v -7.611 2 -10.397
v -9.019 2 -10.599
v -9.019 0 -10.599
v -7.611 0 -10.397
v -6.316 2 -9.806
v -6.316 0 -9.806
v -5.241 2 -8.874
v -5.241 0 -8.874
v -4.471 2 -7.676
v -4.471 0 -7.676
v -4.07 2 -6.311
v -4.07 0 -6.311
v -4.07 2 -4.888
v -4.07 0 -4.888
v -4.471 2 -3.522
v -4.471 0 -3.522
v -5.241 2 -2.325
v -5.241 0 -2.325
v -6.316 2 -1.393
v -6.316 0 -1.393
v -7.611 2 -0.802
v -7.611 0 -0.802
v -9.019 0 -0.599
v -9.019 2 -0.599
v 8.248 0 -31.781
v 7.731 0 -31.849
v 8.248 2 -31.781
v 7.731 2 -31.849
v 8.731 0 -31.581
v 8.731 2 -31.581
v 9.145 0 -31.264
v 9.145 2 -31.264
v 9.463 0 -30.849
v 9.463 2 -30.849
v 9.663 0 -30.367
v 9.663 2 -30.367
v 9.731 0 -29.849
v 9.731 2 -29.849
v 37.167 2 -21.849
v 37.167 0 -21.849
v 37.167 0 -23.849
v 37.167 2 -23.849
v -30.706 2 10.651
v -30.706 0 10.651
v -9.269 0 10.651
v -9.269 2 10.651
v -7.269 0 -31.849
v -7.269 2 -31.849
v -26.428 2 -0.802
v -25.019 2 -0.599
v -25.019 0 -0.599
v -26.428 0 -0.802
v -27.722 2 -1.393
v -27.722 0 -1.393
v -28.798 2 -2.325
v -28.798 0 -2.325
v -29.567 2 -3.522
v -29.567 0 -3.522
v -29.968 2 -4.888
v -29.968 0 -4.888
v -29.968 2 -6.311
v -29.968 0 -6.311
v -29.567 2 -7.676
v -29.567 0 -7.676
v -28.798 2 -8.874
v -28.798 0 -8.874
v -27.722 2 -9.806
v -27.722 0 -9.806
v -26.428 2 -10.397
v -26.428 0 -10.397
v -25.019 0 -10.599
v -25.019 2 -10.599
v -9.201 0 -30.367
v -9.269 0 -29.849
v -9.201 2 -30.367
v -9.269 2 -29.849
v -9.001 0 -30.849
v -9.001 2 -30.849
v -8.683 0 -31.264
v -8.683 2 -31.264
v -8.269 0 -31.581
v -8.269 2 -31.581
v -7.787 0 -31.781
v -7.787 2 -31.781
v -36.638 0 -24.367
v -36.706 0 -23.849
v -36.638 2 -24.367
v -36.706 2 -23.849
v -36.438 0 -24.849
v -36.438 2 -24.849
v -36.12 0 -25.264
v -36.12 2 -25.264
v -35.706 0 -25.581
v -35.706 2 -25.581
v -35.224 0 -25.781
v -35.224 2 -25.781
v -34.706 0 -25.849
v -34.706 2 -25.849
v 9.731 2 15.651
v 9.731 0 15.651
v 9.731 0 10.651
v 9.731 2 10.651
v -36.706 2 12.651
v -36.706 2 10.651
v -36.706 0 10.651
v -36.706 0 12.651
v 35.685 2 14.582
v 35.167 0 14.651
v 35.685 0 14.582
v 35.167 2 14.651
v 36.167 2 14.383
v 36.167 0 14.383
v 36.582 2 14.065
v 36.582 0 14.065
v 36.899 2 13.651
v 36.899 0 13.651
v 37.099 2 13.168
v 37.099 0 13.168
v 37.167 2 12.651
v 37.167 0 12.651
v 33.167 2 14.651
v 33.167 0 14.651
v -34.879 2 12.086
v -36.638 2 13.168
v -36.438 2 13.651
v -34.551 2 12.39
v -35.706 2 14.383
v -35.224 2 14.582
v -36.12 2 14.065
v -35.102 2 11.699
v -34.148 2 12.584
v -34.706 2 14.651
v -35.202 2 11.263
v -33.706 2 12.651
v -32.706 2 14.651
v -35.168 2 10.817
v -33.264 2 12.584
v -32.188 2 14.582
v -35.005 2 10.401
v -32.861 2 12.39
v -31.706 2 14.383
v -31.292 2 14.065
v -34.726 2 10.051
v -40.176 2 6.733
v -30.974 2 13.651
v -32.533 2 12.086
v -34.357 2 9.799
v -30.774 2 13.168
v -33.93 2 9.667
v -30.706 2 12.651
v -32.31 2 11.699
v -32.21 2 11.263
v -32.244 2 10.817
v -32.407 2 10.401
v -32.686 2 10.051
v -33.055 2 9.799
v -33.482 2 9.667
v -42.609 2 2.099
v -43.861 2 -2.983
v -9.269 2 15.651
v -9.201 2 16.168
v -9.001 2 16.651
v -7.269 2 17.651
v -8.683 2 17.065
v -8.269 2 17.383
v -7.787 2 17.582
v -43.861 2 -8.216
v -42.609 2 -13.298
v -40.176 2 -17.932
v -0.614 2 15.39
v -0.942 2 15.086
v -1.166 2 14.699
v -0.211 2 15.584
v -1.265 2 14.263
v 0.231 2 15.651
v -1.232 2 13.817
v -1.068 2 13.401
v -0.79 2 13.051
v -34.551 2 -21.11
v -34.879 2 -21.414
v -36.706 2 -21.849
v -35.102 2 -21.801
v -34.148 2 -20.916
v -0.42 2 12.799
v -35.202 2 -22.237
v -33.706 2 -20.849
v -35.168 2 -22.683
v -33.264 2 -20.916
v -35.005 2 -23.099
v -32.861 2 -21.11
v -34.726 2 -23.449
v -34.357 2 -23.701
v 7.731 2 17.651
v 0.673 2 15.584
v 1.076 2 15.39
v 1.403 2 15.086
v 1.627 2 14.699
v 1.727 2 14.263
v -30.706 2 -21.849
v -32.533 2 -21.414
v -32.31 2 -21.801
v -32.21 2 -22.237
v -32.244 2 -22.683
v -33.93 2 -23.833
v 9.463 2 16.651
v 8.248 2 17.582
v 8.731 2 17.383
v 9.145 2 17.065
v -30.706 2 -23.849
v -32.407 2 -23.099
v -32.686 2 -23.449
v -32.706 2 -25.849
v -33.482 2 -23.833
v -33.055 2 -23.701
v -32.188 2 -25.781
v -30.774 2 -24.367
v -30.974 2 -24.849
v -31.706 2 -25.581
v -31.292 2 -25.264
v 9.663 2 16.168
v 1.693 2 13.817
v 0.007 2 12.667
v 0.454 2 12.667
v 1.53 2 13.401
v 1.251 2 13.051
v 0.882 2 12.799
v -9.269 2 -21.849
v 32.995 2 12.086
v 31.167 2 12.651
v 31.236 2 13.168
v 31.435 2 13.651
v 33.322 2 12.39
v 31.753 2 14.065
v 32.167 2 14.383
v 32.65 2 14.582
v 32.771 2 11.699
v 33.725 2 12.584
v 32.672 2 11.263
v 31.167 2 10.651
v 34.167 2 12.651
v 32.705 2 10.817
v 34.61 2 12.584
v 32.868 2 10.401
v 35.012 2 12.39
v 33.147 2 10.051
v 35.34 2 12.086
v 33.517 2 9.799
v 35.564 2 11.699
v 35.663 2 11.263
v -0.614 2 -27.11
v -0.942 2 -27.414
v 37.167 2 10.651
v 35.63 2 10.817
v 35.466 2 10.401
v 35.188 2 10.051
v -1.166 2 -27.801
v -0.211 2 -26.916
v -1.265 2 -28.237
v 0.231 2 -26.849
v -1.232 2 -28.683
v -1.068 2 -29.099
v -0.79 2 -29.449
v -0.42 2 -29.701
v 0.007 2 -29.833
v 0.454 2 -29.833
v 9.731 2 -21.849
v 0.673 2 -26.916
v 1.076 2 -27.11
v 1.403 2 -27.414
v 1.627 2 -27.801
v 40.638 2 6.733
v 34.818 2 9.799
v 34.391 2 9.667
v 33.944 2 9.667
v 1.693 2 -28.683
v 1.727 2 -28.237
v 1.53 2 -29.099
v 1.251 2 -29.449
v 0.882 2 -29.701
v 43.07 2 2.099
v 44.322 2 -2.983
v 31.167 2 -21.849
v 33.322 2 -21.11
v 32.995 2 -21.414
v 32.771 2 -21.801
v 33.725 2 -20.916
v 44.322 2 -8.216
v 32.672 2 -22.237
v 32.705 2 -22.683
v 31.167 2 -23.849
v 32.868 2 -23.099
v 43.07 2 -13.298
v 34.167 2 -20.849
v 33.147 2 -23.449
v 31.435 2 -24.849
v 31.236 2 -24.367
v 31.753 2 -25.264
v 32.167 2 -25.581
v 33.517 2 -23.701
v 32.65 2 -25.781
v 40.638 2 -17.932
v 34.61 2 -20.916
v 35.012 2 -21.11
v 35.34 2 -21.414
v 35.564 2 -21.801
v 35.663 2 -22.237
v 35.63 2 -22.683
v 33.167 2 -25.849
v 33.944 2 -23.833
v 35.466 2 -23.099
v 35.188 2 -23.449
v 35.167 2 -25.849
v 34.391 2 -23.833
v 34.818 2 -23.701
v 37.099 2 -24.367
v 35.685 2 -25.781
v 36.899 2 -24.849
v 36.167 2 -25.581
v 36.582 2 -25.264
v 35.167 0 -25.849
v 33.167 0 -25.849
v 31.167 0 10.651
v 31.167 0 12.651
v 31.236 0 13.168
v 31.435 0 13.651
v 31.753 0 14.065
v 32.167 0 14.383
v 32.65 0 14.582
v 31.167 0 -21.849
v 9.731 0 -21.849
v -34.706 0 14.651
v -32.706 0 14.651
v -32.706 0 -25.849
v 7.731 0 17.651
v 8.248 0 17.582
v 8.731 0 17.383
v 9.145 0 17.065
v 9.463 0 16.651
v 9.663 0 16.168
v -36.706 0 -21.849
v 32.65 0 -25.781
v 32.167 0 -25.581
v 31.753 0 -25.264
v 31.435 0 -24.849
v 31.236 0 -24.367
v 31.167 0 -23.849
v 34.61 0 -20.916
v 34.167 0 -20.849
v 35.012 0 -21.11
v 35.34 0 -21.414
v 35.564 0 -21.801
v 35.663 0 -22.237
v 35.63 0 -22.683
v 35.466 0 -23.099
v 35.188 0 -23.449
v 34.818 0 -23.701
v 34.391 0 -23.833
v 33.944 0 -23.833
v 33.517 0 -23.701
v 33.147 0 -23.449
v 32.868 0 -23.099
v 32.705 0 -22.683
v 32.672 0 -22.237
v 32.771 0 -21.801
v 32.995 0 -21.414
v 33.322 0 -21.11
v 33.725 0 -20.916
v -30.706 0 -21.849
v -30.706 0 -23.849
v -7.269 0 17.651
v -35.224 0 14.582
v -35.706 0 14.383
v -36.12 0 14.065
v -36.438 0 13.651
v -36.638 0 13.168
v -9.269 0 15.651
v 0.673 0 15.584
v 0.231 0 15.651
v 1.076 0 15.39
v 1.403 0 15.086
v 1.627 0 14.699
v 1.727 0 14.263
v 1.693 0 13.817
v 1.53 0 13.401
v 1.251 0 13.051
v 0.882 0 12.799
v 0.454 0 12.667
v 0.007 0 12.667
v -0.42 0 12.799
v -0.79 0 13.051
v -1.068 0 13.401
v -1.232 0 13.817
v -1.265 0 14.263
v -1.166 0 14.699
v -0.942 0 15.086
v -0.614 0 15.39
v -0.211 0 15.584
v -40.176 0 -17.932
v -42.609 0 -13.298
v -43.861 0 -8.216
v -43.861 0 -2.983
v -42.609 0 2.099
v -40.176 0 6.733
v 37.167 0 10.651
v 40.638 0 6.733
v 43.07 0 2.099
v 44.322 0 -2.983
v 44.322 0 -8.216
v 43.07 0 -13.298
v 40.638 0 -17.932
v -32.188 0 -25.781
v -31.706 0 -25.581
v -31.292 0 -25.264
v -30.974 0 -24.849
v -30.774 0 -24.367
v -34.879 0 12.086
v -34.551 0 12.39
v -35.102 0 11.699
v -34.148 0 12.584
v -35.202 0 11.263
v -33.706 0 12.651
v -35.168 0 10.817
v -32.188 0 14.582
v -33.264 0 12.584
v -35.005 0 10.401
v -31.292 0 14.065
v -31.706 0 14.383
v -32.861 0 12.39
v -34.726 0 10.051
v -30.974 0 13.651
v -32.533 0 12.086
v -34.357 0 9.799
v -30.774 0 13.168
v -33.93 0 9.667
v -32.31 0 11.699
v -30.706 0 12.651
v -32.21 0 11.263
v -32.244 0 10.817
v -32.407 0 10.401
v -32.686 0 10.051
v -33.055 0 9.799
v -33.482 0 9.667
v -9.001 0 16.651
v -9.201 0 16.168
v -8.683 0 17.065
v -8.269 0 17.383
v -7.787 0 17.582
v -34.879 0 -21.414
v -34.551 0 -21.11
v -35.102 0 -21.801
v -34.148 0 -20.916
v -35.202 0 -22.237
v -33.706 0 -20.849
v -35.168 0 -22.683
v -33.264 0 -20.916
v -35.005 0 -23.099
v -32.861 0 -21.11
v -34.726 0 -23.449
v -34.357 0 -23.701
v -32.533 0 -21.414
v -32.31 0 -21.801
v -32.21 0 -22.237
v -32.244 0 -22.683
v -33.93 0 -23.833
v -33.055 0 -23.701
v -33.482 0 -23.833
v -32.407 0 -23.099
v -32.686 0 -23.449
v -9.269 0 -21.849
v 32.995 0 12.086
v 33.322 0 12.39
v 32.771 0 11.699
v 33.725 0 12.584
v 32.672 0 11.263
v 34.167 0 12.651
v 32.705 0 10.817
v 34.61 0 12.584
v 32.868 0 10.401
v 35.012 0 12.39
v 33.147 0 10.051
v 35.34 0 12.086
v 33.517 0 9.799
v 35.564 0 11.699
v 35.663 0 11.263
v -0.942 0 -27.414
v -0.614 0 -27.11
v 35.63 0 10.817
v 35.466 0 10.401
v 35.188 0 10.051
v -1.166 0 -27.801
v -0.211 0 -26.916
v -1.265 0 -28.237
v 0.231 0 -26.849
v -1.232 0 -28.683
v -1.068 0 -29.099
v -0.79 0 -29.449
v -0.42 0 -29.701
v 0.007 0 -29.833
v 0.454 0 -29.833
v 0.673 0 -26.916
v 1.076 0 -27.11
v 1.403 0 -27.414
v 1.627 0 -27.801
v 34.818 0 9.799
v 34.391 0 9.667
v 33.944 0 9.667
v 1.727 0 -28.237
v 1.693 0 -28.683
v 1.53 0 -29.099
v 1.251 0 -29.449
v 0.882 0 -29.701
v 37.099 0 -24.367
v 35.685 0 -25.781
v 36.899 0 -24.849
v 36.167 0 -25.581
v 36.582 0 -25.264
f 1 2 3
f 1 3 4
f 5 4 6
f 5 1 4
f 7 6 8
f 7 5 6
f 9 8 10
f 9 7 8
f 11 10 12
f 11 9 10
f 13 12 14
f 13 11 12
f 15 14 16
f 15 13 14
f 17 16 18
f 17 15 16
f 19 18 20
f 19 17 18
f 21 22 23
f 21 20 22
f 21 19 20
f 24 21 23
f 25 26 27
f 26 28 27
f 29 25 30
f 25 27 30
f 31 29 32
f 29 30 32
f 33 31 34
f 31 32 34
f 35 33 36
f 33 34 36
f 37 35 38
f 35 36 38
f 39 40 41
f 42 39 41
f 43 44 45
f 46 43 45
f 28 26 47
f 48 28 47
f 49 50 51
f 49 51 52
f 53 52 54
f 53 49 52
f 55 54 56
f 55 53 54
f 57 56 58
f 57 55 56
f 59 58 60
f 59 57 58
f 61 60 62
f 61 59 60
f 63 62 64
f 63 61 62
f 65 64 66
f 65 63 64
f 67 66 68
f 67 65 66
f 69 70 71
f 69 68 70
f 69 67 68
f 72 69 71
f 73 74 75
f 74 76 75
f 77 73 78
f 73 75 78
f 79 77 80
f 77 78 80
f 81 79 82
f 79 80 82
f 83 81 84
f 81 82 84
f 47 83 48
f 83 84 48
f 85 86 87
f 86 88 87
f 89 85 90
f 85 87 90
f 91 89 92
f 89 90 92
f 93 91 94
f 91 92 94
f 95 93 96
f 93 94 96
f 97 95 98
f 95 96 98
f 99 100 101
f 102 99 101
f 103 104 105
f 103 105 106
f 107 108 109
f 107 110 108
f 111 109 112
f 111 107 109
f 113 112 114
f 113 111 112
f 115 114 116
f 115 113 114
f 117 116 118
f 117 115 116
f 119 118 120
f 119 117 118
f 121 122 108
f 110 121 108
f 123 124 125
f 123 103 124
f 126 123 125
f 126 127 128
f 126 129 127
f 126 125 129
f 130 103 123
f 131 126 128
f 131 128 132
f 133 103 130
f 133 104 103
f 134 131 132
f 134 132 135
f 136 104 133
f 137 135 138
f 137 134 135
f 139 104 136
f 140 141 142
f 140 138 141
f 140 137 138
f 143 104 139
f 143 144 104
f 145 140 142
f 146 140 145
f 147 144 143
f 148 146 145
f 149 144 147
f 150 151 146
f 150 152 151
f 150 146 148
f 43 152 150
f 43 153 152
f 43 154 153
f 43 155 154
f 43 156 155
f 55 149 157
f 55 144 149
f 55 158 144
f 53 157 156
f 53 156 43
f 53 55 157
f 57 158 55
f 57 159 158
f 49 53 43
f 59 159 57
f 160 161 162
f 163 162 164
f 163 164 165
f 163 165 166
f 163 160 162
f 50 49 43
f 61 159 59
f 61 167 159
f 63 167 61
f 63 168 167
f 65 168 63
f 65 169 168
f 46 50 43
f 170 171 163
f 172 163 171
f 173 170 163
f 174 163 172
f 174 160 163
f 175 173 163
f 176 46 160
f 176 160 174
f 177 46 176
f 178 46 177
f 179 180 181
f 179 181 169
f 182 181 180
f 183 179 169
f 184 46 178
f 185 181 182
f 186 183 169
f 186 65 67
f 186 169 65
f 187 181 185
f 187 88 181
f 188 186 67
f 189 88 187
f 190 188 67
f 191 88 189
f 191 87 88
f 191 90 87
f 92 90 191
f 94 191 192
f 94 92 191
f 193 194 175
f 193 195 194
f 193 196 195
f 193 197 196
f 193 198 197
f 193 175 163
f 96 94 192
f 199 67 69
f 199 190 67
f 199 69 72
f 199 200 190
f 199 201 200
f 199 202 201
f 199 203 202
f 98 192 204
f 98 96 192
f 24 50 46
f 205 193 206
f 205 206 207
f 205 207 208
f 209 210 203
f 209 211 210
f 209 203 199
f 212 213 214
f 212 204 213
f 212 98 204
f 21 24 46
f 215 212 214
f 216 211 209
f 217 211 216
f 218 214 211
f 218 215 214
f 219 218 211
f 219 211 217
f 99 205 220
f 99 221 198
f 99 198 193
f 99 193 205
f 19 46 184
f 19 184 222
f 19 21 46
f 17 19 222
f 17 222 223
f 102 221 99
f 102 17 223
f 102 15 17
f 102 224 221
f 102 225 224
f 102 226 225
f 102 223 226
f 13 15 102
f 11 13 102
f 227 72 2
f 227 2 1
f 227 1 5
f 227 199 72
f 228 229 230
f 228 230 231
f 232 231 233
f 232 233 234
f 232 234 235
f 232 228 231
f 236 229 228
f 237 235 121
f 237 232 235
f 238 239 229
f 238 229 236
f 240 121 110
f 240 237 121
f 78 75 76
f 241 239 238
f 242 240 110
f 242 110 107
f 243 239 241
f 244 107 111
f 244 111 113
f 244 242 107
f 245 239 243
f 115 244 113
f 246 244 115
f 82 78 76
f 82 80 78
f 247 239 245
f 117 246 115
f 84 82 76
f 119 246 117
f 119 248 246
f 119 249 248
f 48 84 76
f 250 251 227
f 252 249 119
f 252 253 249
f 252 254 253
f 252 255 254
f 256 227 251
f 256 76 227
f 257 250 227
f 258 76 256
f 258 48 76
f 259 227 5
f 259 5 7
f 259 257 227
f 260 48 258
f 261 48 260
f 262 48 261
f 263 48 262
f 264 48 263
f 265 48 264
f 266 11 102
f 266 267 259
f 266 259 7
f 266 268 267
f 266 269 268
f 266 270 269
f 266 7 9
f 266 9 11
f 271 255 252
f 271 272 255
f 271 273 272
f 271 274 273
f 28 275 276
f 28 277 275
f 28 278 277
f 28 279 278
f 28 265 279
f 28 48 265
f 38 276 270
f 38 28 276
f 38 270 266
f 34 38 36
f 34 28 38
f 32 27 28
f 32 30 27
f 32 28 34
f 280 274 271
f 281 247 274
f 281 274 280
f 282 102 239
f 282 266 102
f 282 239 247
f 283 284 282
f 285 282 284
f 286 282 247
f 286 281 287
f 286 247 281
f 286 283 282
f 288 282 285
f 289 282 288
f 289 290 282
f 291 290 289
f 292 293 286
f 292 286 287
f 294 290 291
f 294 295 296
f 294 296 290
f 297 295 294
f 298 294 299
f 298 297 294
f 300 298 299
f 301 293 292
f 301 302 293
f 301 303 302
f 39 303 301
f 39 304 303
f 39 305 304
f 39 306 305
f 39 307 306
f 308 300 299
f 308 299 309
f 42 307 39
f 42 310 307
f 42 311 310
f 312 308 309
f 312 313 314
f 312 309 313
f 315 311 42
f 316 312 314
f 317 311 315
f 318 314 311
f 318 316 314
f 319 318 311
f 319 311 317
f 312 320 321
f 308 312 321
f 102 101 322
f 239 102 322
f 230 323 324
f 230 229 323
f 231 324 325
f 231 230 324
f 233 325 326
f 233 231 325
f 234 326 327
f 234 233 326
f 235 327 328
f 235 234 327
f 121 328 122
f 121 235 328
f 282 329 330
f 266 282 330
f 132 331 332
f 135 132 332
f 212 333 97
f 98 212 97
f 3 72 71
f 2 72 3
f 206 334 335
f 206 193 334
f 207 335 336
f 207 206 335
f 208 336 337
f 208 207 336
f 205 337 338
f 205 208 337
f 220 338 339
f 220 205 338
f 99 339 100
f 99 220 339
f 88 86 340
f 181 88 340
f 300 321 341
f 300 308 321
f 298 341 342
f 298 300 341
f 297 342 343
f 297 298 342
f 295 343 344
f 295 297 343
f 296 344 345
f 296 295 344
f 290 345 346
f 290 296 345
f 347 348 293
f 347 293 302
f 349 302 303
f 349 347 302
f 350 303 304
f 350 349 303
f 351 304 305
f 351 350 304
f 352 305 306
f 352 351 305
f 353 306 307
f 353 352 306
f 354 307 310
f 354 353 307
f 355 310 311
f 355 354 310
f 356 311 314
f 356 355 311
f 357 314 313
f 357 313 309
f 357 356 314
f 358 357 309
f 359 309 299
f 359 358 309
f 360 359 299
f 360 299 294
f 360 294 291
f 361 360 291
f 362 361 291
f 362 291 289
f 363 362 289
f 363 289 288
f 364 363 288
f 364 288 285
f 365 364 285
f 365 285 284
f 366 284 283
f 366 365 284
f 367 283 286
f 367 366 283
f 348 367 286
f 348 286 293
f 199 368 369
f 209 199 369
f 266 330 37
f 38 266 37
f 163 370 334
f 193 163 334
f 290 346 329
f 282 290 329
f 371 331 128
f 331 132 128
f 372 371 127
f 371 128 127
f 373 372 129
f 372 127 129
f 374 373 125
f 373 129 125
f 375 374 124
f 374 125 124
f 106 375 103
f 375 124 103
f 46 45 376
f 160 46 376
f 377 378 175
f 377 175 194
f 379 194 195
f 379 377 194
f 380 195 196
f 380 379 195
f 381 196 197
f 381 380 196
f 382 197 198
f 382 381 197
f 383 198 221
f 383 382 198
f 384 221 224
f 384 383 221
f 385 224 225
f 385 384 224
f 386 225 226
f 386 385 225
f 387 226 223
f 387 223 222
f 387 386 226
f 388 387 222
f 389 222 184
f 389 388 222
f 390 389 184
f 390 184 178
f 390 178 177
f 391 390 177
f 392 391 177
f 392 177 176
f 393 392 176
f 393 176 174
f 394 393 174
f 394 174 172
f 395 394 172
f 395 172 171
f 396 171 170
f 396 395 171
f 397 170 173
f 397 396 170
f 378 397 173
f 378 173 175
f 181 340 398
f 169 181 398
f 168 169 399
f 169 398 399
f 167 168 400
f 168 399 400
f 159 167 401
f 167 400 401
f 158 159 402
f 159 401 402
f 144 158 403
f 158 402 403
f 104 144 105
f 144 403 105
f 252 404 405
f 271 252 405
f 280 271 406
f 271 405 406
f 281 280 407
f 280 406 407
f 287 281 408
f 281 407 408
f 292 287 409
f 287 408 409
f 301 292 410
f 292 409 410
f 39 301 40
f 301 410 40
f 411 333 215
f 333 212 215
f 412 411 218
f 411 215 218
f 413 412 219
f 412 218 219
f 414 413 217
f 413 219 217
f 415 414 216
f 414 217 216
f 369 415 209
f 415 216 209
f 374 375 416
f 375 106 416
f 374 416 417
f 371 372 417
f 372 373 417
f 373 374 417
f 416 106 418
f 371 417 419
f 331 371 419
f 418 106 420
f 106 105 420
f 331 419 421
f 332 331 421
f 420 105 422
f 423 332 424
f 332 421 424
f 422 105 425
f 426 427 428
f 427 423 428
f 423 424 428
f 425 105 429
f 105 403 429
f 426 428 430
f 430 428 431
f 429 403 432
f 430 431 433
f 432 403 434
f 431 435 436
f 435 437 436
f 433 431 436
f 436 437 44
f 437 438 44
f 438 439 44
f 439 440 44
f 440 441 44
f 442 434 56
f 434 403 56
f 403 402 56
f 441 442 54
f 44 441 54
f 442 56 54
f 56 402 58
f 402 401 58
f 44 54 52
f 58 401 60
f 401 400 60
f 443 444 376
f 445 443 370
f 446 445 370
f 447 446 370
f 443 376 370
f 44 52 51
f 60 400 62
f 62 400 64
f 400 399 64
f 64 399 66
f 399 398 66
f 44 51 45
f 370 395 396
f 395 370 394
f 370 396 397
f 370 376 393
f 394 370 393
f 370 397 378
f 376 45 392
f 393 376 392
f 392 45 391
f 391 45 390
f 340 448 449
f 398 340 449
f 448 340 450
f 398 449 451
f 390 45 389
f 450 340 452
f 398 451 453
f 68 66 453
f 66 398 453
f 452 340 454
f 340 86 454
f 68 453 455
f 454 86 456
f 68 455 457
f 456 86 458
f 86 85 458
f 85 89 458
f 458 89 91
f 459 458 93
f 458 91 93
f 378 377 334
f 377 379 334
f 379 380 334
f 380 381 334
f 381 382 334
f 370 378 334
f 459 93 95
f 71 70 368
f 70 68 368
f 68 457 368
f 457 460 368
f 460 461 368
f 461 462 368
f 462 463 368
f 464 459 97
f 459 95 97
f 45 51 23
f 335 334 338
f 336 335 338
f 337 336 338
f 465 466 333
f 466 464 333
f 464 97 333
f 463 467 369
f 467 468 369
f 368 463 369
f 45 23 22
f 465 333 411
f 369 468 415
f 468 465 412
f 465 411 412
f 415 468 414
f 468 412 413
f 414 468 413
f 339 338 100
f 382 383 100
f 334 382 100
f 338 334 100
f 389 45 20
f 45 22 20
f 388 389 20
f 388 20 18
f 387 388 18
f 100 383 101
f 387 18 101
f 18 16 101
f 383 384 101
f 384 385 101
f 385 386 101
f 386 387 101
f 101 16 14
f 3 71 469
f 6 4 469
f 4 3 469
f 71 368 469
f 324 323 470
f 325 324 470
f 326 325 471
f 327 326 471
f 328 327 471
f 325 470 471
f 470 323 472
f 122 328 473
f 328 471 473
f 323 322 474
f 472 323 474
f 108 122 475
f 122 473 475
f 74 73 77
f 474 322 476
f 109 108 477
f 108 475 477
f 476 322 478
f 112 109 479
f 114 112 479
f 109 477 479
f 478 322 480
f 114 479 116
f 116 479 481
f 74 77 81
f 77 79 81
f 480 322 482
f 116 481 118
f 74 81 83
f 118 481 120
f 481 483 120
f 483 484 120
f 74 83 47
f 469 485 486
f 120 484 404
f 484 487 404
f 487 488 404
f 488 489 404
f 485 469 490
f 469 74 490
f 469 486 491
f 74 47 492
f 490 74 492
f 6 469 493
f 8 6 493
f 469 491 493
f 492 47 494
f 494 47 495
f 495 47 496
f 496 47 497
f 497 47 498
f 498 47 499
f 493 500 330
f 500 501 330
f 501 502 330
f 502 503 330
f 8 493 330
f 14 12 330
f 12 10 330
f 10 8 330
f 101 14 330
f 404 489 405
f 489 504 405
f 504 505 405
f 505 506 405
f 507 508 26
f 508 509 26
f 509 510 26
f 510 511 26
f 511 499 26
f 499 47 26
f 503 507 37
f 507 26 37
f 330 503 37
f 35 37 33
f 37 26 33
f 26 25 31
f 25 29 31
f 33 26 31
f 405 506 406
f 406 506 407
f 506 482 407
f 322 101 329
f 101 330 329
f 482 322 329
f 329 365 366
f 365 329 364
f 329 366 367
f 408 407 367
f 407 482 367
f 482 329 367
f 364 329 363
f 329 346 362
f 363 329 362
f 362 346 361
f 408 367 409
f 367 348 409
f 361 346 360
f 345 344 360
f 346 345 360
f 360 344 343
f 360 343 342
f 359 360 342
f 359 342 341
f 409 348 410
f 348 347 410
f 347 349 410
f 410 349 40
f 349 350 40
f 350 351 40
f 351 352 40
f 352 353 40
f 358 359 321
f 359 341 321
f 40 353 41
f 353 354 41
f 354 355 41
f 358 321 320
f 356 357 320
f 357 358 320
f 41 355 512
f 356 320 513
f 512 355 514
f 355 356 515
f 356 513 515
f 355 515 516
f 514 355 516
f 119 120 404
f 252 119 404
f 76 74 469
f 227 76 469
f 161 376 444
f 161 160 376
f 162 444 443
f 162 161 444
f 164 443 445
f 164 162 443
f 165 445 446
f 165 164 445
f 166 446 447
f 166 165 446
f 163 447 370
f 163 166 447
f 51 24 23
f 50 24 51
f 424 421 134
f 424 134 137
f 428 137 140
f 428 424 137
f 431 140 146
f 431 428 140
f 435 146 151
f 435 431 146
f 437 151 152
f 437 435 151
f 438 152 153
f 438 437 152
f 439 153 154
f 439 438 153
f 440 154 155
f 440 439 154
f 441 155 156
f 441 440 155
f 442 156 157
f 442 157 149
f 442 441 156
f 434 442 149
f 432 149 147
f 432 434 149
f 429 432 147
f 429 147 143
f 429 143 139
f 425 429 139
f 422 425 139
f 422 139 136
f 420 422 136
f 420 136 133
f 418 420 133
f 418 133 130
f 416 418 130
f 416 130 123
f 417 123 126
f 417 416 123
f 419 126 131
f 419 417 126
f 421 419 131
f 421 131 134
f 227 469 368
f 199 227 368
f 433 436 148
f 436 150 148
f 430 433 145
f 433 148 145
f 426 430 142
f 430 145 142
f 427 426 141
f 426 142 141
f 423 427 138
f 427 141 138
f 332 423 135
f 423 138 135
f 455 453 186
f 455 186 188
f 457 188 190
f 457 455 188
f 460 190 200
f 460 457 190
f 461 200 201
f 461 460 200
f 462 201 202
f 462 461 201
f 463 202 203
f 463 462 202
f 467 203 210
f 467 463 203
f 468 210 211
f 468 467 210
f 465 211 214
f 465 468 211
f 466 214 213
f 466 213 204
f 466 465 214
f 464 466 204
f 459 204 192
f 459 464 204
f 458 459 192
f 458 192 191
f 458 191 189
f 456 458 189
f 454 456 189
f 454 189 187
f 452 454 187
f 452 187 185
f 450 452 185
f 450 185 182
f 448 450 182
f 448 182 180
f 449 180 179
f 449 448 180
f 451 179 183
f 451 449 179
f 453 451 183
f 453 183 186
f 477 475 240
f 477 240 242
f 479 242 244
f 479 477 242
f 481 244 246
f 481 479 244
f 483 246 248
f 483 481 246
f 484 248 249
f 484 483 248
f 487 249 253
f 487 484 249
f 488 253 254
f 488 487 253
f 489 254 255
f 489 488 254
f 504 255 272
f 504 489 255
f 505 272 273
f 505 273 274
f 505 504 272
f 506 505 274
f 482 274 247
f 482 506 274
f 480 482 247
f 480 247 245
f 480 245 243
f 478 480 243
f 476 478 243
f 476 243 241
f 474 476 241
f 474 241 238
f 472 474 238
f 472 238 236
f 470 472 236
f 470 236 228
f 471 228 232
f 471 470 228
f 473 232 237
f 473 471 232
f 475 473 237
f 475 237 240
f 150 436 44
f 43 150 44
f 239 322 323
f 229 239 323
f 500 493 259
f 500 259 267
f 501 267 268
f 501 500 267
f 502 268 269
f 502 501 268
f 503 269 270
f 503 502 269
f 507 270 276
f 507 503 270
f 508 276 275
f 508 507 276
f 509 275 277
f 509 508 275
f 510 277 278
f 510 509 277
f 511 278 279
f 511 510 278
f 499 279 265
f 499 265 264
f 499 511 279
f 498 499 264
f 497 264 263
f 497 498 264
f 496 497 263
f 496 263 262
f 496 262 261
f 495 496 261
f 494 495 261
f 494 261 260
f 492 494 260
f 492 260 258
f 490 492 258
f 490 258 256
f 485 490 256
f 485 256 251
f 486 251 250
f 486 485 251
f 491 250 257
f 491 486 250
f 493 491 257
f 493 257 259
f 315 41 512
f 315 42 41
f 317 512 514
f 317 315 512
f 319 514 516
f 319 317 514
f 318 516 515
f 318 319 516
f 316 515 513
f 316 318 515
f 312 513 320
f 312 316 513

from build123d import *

# Parameters (mm, degrees)
SKETCH3_R           = 1.5
BOSS_EXTRUDE3_DEPTH = 2
CUT_EXTRUDE1_DEPTH  = 3
FILLET1_R           = 2


with BuildPart() as part:
    # Sketch3 → Boss-Extrude3 (new body)
    with BuildSketch(Plane(origin=(0, 0, 0), x_dir=(1, 0, 0), z_dir=(0, 1, 0))):
        with BuildLine():
            Line((-9.26926183, -10.650603484), (-9.26926183, -17.650603484))
            Line((-9.26926183, -17.650603484), (9.73073817, -17.650603484))
            Line((9.73073817, -17.650603484), (9.73073817, -10.650603484))
            Line((9.73073817, -10.650603484), (31.167436549, -10.650603484))
            Line((31.167436549, -10.650603484), (31.167436549, -14.650603484))
            Line((31.167436549, -14.650603484), (37.167436549, -14.650603484))
            Line((37.167436549, -14.650603484), (37.167436549, -10.650603484))
            ThreePointArc((37.167436549, -10.650603484), (44.48073817, 5.599396516), (37.167436549, 21.849396516))
            Line((37.167436549, 21.849396516), (37.167436549, 25.849396516))
            Line((37.167436549, 25.849396516), (31.167436549, 25.849396516))
            Line((31.167436549, 25.849396516), (31.167436549, 21.849396516))
            Line((31.167436549, 21.849396516), (9.73073817, 21.849396516))
            Line((9.73073817, 21.849396516), (9.73073817, 31.849396516))
            Line((9.73073817, 31.849396516), (-9.26926183, 31.849396516))
            Line((-9.26926183, 31.849396516), (-9.26926183, 21.849396516))
            Line((-9.26926183, 21.849396516), (-30.705960209, 21.849396516))
            Line((-30.705960209, 21.849396516), (-30.705960209, 25.849396516))
            Line((-30.705960209, 25.849396516), (-36.705960209, 25.849396516))
            Line((-36.705960209, 25.849396516), (-36.705960209, 21.849396516))
            ThreePointArc((-36.705960209, 21.849396516), (-44.01926183, 5.599396516), (-36.705960209, -10.650603484))
            Line((-36.705960209, -10.650603484), (-36.705960209, -14.650603484))
            Line((-36.705960209, -14.650603484), (-30.705960209, -14.650603484))
            Line((-30.705960209, -14.650603484), (-30.705960209, -10.650603484))
            Line((-30.705960209, -10.650603484), (-9.26926183, -10.650603484))
        make_face()
        with Locations(Location((-33.705960209, 22.349396516, 0), (0, 0, 270))):
            Circle(SKETCH3_R, mode=Mode.SUBTRACT)
        with Locations(Location((-33.705960209, -11.150603484, 0), (0, 0, 270))):
            Circle(SKETCH3_R, mode=Mode.SUBTRACT)
        with Locations(Location((34.167436549, -11.150603484, 0), (0, 0, 270))):
            Circle(SKETCH3_R, mode=Mode.SUBTRACT)
        with Locations(Location((34.167436549, 22.349396516, 0), (0, 0, 270))):
            Circle(SKETCH3_R, mode=Mode.SUBTRACT)
        with Locations(Location((0.23073817, -14.150603484, 0), (0, 0, 270))):
            Circle(SKETCH3_R, mode=Mode.SUBTRACT)
        with Locations(Location((0.23073817, 28.349396516, 0), (0, 0, 270))):
            Circle(SKETCH3_R, mode=Mode.SUBTRACT)
    extrude(amount=BOSS_EXTRUDE3_DEPTH)

    # Sketch4 → Cut-Extrude1 (cut)
    with BuildSketch(Plane(origin=(0, 2, 0), x_dir=(1, 0, 0), z_dir=(0, 1, 0))):
        with BuildLine():
            Line((-25.01926183, 10.599396516), (-9.01926183, 10.599396516))
            ThreePointArc((-9.01926183, 10.599396516), (-4.01926183, 5.599396516), (-9.01926183, 0.599396516))
            Line((-9.01926183, 0.599396516), (-25.01926183, 0.599396516))
            ThreePointArc((-25.01926183, 0.599396516), (-30.01926183, 5.599396516), (-25.01926183, 10.599396516))
        make_face()
    extrude(amount=-CUT_EXTRUDE1_DEPTH, mode=Mode.SUBTRACT)

    # Fillet1
    fillet1_edges = [part.edges().sort_by_distance(p)[0] for p in [
        (-30.705960209, 1, 14.650603484),
        (-36.705960209, 1, 14.650603484),
        (-36.705960209, 1, -25.849396516),
        (-30.705960209, 1, -25.849396516),
        (-9.26926183, 1, -31.849396516),
        (9.73073817, 1, -31.849396516),
        (31.167436549, 1, -25.849396516),
        (37.167436549, 1, -25.849396516),
        (37.167436549, 1, 14.650603484),
        (31.167436549, 1, 14.650603484),
        (9.73073817, 1, 17.650603484),
        (-9.26926183, 1, 17.650603484),
    ]]
    fillet(fillet1_edges, radius=FILLET1_R)


solid = part.part
